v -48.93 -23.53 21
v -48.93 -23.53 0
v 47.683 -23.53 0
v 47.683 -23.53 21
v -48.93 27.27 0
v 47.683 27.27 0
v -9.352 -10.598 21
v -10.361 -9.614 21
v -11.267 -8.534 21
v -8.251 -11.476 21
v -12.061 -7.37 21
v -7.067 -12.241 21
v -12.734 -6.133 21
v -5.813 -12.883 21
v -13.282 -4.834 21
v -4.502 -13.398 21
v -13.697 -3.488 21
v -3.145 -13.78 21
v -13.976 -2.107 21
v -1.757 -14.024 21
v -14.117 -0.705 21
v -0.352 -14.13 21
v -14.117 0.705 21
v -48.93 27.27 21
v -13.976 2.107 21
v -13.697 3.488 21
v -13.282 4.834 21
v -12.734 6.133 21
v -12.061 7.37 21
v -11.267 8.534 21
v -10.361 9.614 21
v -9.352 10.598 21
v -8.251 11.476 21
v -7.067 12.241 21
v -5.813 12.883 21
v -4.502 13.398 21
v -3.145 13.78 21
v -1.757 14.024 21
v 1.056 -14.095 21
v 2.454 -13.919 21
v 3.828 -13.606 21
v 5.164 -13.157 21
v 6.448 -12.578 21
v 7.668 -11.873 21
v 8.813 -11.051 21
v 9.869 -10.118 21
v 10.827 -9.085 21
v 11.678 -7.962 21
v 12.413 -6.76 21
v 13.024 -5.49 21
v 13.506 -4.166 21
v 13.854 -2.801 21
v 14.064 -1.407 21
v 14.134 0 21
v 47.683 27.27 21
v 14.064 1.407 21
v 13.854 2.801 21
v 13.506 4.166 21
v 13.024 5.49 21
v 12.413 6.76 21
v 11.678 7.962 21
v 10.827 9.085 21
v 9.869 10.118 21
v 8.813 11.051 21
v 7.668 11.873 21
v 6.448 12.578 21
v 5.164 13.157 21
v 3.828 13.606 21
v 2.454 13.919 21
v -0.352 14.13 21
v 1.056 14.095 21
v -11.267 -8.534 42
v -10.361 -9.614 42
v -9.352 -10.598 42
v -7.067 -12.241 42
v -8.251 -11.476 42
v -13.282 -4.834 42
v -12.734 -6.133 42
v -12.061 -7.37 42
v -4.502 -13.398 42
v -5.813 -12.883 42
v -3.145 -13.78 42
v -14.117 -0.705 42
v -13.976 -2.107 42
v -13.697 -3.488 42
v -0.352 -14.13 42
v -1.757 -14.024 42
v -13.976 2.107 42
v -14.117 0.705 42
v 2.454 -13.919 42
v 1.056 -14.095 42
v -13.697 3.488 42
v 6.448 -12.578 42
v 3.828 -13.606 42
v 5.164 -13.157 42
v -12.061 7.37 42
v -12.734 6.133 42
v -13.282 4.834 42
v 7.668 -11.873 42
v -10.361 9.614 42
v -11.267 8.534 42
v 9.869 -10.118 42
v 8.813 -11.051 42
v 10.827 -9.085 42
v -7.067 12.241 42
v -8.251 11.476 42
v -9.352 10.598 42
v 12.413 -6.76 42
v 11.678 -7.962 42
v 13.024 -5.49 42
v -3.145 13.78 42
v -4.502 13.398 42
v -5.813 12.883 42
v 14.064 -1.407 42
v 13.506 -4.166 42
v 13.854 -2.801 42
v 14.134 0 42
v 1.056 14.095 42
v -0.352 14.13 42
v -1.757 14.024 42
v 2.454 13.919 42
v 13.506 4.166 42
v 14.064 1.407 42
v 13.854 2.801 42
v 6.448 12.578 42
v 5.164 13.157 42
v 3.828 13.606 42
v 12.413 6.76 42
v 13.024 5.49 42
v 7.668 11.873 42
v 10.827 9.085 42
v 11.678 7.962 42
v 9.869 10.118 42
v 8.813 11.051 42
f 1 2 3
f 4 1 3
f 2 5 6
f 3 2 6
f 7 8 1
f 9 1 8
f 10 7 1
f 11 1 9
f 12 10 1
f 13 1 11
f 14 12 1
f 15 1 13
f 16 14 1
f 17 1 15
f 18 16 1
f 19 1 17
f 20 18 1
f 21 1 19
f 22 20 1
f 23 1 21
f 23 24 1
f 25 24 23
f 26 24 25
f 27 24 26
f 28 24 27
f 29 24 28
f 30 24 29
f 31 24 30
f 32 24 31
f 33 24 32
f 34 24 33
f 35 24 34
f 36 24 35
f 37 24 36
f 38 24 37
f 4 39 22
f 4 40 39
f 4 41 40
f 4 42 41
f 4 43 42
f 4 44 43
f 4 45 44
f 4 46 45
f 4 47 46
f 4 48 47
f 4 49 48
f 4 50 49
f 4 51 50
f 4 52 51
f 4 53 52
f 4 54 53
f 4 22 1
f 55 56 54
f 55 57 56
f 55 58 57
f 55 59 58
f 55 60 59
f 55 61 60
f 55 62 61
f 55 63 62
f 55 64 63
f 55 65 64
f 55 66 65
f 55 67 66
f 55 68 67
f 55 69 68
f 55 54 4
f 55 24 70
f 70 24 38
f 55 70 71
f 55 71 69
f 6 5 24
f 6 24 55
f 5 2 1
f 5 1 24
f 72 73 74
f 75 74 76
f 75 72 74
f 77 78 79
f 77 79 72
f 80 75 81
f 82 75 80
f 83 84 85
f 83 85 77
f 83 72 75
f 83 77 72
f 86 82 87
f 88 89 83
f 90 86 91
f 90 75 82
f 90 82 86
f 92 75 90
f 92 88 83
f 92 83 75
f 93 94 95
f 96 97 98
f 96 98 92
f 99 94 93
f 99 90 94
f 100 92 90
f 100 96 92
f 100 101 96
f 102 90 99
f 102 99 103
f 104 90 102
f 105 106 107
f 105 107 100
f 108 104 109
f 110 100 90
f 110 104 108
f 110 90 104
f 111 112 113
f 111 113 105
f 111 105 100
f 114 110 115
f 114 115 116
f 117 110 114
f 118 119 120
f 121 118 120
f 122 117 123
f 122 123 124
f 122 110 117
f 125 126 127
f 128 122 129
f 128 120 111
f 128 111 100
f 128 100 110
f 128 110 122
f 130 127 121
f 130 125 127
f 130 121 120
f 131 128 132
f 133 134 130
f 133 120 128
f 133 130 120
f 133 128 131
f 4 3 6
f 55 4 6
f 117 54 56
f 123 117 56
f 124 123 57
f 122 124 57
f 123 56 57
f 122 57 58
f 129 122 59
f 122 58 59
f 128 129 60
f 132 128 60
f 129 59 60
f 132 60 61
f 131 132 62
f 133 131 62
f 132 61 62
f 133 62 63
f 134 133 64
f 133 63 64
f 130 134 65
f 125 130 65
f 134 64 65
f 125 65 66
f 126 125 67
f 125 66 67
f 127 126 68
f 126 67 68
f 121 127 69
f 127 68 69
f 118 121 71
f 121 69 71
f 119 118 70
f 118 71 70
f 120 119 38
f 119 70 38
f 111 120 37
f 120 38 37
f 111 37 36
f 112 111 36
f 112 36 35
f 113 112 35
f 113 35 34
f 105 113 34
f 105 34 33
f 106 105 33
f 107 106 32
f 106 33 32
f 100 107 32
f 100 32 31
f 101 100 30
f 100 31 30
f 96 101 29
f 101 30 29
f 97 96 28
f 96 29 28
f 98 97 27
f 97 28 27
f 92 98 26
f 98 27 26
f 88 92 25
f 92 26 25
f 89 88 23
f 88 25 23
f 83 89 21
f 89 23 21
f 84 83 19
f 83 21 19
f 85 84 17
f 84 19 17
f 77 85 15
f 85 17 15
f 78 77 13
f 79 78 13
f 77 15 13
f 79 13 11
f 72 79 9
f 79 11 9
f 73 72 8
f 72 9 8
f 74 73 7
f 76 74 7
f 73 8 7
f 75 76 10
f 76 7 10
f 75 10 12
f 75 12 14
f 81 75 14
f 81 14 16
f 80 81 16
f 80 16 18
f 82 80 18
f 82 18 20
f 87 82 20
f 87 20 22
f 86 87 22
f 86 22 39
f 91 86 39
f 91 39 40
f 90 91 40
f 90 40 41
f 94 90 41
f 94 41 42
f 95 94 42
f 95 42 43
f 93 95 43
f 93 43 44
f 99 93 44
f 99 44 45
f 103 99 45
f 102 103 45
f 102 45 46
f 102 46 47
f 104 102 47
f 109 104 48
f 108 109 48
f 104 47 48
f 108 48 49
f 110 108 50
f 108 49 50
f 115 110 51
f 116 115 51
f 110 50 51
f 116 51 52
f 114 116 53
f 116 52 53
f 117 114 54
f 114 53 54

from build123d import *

# Parameters (mm, degrees)
SKETCH1_W           = 96.613496933
SKETCH1_H           = 50.8
BOSS_EXTRUDE1_DEPTH = 21
SKETCH4_R           = 14.134180844
BOSS_EXTRUDE2_DEPTH = 21


with BuildPart() as part:
    # Sketch1 → Boss-Extrude1 (new body)
    with BuildSketch(Plane.XY):
        with Locations((-0.623312883, 1.86993865)):
            Rectangle(SKETCH1_W, SKETCH1_H)
    extrude(amount=BOSS_EXTRUDE1_DEPTH)

    # Sketch4 → Boss-Extrude2 (add)
    with BuildSketch(Plane.XY.offset(21)):
        Circle(SKETCH4_R)
    extrude(amount=BOSS_EXTRUDE2_DEPTH)


solid = part.part
